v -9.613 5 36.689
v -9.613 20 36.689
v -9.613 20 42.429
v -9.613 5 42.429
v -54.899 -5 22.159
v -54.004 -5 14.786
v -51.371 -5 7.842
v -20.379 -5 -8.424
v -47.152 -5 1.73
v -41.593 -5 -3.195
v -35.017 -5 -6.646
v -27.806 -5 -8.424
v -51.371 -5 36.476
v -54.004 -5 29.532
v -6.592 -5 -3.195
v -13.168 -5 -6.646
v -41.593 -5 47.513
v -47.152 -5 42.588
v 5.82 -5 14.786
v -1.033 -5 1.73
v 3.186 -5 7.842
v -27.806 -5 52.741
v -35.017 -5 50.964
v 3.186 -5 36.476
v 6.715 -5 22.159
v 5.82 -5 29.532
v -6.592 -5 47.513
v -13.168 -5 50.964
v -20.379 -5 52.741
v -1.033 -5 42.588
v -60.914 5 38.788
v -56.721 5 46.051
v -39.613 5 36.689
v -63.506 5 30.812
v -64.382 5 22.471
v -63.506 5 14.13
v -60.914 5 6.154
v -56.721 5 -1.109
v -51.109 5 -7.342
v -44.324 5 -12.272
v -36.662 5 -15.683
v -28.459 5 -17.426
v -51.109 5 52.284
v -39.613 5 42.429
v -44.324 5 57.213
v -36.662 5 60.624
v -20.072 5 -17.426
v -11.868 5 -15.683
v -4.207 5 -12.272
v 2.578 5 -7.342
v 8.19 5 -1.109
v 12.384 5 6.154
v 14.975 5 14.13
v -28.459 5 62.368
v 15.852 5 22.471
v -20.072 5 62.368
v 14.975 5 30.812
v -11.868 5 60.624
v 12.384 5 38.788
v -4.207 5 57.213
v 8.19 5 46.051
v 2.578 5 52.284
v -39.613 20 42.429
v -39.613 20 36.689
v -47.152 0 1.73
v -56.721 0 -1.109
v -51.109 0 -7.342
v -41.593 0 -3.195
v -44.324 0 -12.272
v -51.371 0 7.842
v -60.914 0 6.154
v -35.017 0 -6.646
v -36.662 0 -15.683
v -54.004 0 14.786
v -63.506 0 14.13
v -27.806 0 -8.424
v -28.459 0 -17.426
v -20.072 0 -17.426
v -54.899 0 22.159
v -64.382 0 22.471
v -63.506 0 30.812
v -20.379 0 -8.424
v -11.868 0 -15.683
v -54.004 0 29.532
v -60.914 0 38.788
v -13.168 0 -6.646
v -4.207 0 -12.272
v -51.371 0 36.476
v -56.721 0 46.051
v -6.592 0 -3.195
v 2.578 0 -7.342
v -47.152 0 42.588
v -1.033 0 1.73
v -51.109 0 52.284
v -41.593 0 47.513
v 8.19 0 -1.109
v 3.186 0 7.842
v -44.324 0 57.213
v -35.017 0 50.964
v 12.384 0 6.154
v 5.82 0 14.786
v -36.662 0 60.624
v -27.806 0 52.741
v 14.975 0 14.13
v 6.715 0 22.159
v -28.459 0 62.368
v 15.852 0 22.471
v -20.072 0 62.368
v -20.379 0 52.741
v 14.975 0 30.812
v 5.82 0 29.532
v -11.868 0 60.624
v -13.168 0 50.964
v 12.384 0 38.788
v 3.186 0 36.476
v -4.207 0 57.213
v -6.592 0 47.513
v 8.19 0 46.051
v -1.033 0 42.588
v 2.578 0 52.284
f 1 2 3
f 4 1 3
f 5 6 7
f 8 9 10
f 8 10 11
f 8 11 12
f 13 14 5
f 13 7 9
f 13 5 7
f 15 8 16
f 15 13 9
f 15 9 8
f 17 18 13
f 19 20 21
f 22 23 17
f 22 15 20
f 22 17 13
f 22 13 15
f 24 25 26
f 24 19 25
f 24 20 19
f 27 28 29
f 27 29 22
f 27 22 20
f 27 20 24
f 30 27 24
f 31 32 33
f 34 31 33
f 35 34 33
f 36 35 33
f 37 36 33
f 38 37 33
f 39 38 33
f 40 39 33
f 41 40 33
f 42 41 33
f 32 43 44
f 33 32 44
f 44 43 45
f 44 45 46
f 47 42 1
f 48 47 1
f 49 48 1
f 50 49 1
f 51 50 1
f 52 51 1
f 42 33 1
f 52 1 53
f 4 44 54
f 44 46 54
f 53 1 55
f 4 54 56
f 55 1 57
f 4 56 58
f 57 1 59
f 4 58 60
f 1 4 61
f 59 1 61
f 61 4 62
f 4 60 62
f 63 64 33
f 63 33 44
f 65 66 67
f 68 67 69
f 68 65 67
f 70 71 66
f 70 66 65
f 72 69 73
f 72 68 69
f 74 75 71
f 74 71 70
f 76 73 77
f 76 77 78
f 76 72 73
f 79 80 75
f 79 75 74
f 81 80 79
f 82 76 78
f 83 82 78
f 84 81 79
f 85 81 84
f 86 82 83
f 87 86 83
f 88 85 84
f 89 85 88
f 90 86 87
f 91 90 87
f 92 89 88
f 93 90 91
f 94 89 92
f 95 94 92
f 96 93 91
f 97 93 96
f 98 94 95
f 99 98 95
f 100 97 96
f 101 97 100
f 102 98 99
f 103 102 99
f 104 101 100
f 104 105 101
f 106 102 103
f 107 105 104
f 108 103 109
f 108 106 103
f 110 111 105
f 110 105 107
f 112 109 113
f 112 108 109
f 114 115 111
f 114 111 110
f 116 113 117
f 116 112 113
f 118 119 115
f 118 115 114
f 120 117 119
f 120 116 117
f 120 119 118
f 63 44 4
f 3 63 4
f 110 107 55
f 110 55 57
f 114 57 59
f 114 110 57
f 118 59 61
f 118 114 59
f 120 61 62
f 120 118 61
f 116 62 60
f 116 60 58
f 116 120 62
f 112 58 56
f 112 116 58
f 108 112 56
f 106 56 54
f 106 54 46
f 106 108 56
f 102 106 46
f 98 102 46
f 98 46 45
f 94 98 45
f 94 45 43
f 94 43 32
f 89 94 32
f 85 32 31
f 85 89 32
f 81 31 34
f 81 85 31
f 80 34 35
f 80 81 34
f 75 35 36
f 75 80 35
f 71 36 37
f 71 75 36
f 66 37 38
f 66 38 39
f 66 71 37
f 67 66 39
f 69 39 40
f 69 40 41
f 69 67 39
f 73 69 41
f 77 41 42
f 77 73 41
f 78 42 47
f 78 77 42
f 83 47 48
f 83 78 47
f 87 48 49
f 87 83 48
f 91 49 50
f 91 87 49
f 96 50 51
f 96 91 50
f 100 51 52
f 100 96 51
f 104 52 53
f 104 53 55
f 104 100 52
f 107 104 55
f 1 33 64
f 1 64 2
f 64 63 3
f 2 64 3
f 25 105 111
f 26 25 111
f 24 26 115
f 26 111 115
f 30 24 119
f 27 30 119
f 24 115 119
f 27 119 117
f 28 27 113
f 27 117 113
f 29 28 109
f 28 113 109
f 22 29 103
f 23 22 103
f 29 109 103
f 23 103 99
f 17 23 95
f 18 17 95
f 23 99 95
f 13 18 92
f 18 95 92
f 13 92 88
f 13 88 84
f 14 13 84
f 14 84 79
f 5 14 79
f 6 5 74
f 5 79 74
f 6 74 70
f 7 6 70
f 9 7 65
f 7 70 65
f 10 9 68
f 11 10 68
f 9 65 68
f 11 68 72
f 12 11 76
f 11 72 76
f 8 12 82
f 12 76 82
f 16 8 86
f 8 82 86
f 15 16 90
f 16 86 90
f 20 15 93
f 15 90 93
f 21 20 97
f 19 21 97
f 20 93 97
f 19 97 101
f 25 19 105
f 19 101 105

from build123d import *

# Parameters (mm, degrees)
F0_R     = 30.807139
F1_DEPTH = 5
F2_R     = 40.117073
F3_DEPTH = 5
F4_W     = 30
F4_H     = 5.740043
F5_DEPTH = 20


with BuildPart() as f1:
    # F0 (on Front) → F1 (new body)
    with BuildSketch(Plane.XZ):
        with Locations((-24.092231, 22.158904)):
            Circle(F0_R)
    extrude(amount=F1_DEPTH)

    # F2 (on Front) → F3 (join)
    with BuildSketch(Plane.XZ):
        with Locations((-24.265252, 22.470835)):
            Circle(F2_R)
    extrude(amount=-F3_DEPTH)

    # F4 (on Front) → F5 (join)
    with BuildSketch(Plane.XZ):
        with Locations((-24.613258, 39.558847)):
            Rectangle(F4_W, F4_H)
    extrude(amount=-F5_DEPTH)


solid = f1.part
